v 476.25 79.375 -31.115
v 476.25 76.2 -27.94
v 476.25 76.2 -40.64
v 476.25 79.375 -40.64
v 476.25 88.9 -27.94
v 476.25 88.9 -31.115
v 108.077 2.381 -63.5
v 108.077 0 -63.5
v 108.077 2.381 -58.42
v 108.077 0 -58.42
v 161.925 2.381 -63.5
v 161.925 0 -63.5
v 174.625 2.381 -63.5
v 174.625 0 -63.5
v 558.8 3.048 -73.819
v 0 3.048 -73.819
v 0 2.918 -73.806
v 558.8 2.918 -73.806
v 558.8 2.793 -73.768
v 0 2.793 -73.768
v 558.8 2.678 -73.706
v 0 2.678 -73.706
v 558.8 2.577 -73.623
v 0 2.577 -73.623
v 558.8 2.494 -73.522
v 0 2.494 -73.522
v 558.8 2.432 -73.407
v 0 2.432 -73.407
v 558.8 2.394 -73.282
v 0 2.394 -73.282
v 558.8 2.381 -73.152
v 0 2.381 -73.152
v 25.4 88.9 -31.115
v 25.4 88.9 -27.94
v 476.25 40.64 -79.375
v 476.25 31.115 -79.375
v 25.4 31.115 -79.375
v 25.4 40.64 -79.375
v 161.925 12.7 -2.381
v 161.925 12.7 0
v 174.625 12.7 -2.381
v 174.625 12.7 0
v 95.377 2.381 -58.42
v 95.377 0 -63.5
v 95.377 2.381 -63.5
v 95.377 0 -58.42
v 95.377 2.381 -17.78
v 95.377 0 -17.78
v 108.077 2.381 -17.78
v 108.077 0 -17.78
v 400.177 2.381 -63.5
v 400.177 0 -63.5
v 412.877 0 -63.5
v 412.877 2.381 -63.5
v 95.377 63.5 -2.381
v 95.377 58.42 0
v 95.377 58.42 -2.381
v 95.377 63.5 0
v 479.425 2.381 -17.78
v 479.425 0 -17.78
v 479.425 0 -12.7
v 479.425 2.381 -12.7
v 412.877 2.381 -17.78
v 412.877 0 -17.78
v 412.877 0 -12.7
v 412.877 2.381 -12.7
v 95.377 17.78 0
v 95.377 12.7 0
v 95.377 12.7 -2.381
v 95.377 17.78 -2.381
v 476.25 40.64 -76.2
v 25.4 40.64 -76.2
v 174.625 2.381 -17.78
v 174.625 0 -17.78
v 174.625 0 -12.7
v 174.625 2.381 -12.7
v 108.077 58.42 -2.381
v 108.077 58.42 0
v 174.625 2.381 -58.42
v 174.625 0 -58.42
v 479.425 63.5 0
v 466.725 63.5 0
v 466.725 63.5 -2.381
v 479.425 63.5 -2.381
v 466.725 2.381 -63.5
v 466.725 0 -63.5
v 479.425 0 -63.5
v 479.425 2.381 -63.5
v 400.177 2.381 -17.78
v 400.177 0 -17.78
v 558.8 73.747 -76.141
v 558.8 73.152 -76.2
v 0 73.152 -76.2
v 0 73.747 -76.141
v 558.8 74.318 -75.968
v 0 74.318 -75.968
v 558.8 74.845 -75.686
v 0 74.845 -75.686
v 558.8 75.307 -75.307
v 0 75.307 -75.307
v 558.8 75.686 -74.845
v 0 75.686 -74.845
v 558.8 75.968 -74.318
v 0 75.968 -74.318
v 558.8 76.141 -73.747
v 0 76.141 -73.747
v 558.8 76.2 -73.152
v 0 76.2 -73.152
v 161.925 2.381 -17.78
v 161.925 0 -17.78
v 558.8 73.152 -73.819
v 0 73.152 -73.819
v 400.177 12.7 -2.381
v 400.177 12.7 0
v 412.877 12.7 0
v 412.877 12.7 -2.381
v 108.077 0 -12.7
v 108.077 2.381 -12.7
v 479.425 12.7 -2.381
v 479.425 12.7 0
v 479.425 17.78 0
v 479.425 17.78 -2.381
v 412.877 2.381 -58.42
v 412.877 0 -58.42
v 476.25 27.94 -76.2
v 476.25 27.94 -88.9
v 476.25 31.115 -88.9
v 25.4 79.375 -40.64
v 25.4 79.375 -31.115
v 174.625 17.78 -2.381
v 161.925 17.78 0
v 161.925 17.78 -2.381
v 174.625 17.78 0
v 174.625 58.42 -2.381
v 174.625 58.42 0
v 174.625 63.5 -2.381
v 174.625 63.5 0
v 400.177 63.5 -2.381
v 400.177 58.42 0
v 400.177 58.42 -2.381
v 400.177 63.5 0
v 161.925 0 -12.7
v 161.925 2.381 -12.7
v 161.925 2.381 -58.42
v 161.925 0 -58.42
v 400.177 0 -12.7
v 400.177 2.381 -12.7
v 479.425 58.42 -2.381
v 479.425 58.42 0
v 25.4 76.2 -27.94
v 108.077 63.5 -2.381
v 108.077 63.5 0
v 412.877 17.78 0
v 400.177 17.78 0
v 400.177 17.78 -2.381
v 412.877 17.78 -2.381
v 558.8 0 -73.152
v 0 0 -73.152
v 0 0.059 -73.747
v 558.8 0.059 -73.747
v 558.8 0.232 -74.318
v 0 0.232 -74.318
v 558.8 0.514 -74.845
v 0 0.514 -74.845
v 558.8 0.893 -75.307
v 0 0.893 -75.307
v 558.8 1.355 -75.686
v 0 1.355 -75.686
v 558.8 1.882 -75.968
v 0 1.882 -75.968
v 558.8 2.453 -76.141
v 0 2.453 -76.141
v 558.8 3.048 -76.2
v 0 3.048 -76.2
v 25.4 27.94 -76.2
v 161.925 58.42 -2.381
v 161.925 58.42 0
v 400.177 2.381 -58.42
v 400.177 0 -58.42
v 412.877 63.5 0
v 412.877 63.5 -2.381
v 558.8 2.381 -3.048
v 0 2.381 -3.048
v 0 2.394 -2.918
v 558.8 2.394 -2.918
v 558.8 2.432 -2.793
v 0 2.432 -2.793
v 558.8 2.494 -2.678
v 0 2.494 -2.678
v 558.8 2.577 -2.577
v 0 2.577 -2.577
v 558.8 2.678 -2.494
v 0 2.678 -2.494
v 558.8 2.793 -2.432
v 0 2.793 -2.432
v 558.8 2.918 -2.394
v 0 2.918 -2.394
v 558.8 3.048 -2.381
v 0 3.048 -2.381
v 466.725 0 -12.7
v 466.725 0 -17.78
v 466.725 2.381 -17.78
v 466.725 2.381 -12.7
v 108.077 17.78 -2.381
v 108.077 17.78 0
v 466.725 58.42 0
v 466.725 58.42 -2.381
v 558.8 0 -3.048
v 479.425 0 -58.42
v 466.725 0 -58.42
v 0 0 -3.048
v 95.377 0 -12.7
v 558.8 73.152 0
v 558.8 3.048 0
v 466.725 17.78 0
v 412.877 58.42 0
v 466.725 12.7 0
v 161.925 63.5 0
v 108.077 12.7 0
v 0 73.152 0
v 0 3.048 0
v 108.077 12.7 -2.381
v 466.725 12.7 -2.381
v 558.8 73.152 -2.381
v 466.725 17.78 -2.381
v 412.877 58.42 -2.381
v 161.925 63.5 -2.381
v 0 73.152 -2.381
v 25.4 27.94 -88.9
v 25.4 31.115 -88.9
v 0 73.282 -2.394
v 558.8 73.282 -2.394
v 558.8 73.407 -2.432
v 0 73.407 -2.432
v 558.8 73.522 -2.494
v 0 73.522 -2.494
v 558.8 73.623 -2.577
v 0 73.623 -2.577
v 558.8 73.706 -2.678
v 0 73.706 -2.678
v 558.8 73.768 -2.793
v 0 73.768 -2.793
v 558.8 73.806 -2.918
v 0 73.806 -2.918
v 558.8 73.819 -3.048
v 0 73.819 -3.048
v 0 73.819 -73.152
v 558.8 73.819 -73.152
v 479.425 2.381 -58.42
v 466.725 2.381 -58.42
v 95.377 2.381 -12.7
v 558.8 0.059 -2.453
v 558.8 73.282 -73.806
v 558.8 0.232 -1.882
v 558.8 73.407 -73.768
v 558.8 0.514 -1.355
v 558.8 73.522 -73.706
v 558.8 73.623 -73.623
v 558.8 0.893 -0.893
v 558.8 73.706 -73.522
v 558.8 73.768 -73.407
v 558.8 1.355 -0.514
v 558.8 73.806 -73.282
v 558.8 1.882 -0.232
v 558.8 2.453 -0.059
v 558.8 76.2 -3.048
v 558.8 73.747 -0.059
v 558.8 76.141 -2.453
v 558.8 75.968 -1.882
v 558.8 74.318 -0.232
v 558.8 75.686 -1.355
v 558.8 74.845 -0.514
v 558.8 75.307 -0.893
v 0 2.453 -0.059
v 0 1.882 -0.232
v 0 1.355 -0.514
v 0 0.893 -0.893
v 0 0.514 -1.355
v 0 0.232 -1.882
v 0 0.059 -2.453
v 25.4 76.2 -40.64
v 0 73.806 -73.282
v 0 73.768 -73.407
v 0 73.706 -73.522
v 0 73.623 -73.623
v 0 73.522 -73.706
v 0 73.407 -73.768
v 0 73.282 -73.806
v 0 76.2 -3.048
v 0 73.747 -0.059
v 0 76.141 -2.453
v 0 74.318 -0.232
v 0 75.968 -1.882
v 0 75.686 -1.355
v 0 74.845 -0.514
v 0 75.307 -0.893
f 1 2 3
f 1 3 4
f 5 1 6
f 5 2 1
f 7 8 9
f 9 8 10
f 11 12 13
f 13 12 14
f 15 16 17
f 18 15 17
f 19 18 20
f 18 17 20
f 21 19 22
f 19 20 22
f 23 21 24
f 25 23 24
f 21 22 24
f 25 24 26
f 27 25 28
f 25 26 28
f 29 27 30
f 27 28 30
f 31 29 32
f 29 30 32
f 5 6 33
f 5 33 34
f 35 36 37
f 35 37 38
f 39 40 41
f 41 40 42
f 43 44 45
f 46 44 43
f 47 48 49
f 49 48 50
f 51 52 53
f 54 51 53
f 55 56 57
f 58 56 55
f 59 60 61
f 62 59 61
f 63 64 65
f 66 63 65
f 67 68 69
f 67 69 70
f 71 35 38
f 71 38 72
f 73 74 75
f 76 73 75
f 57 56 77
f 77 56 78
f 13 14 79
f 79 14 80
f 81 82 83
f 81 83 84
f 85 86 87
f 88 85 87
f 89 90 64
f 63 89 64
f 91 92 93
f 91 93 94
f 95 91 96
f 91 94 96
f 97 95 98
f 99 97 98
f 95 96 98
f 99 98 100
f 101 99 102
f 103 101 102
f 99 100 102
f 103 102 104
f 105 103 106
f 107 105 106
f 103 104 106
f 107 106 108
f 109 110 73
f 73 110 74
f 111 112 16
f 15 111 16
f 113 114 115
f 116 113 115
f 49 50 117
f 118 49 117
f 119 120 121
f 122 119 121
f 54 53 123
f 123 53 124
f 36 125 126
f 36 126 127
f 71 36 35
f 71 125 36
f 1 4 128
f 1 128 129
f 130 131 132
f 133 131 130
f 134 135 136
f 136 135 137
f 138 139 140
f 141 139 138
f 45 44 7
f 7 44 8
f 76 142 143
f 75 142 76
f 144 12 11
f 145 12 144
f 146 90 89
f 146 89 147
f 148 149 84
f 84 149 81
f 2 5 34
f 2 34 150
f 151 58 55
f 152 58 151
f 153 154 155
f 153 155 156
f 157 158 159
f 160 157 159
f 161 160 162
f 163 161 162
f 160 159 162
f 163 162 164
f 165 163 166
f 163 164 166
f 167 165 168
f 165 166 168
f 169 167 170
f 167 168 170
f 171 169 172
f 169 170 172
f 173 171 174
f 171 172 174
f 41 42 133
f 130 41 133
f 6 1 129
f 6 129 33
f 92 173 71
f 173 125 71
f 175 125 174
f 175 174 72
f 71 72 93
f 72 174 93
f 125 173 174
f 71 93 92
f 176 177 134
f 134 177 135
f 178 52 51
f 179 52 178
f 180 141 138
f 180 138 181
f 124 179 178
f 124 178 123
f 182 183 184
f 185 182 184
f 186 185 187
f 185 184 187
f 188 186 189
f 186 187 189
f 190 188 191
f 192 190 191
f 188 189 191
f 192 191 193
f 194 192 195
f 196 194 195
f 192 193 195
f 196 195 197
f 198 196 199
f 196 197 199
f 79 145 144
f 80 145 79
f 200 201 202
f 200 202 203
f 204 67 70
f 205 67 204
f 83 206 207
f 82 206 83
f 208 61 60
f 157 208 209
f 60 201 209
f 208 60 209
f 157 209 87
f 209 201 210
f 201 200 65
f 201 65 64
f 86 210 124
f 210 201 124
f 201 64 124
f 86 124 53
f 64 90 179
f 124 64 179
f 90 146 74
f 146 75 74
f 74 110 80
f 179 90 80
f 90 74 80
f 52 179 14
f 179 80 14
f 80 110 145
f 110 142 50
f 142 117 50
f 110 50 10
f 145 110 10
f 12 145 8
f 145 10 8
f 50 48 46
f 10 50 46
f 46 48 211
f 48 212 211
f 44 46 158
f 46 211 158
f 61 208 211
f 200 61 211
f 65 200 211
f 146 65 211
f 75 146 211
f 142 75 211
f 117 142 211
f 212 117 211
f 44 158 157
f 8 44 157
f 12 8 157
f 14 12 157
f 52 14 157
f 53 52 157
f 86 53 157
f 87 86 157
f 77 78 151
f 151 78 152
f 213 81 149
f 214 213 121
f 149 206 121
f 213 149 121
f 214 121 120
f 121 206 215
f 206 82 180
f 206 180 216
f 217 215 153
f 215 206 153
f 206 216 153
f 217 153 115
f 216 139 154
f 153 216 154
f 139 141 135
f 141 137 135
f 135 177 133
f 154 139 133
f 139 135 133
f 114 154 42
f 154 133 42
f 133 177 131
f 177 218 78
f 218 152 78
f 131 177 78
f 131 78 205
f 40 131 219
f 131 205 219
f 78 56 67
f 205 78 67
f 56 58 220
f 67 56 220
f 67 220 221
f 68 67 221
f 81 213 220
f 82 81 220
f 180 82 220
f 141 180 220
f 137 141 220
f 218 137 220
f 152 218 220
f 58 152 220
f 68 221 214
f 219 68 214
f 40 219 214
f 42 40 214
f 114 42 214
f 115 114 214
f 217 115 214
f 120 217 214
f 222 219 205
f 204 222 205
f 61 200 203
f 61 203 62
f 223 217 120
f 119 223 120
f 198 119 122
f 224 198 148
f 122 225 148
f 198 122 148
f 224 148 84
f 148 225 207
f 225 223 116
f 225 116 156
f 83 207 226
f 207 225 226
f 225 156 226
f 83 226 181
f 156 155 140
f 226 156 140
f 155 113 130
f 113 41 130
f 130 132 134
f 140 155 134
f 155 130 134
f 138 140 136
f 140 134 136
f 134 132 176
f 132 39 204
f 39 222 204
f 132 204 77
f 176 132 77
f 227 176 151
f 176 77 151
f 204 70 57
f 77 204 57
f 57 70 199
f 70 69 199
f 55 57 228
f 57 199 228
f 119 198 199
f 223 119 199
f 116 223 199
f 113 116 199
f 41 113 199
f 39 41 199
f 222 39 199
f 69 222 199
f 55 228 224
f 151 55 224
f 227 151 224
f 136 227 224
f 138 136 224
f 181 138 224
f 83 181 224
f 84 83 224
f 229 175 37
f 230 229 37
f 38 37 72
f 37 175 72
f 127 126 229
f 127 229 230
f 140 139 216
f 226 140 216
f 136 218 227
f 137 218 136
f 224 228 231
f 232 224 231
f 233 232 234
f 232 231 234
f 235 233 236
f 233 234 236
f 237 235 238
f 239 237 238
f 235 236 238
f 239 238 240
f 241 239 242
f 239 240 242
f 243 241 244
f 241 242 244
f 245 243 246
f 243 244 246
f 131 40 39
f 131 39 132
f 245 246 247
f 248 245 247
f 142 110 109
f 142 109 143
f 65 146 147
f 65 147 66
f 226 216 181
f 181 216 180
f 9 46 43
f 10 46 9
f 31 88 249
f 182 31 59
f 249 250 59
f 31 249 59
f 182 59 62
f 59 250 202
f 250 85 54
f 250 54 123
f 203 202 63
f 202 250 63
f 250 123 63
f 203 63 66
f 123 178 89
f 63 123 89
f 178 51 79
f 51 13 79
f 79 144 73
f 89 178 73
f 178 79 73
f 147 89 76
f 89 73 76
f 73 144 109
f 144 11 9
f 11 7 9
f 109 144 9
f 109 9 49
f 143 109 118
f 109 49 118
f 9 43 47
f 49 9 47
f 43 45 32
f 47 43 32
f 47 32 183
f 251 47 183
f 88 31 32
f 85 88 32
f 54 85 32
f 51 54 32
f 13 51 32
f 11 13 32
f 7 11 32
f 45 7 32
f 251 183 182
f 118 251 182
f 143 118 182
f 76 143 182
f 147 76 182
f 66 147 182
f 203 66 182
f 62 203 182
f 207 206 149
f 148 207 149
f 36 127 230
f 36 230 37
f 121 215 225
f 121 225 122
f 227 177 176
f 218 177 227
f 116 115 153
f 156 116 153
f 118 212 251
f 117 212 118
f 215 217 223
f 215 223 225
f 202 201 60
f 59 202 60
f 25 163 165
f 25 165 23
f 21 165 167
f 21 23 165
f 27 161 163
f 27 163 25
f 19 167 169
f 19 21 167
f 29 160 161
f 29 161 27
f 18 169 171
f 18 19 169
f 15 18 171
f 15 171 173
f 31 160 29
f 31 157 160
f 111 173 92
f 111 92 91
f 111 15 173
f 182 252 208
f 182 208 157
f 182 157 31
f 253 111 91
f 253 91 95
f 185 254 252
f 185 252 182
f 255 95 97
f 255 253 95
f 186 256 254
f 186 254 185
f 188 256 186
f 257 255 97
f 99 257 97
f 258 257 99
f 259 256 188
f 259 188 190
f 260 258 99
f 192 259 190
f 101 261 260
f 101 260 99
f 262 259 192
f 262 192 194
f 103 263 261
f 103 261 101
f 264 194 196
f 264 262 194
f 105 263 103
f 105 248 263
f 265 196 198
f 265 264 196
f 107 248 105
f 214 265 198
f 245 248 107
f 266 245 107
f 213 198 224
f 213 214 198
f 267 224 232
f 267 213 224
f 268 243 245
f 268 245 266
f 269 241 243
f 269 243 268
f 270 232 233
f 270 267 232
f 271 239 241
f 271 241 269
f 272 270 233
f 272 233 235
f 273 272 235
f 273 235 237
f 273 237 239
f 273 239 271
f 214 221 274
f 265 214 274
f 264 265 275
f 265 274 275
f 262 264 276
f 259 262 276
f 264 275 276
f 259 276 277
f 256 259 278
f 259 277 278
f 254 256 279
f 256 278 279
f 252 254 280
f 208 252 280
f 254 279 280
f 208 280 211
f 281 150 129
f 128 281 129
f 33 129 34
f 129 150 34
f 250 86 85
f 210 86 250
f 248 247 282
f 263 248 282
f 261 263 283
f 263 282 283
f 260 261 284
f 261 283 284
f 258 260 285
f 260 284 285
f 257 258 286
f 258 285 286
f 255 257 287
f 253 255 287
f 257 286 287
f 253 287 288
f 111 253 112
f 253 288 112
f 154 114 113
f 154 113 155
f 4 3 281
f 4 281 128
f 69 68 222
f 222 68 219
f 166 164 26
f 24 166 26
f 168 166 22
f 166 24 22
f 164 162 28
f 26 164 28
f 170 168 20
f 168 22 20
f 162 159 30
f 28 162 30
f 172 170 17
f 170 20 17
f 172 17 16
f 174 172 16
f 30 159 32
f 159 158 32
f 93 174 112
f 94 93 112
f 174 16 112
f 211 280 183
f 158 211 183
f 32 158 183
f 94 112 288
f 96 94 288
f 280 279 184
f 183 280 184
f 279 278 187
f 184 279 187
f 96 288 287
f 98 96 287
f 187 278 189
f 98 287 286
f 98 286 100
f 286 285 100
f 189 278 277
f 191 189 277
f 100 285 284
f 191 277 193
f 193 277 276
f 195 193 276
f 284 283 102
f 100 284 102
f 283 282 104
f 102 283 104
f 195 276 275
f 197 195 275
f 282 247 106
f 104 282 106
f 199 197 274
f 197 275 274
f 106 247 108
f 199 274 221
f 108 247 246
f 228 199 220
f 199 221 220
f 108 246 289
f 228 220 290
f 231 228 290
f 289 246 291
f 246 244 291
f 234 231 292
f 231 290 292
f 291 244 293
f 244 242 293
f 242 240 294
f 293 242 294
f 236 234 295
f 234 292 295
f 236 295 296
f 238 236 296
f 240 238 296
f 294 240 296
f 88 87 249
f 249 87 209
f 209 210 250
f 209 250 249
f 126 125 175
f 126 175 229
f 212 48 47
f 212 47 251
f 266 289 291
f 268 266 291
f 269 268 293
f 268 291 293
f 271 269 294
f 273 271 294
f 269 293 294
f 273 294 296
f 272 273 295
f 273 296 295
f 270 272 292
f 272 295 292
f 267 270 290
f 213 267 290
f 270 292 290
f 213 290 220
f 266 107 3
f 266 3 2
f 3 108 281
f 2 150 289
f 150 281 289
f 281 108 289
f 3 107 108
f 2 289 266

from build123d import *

# Parameters (mm, degrees)
F1_DEPTH = 558.8
F2_W     = 12.7
F2_H     = 5.08
F3_DEPTH = 2.38125
F4_DEPTH = 2.38125
F5_W     = 12.7
F5_H     = 5.08
F6_DEPTH = 2.38125
F8_DEPTH = 533.4
F9_DEPTH = 82.55


with BuildPart() as f1:
    # F0 (on Right) → F1 (new body)
    with BuildSketch(Plane.YZ):
        with BuildLine():
            Line((73.152, 0), (3.048, 0))
            ThreePointArc((3.048, 0), (0.892739, -0.892739), (0, -3.048))
            Line((0, -3.048), (0, -73.152))
            ThreePointArc((0, -73.152), (0.892739, -75.307261), (3.048, -76.2))
            Line((3.048, -76.2), (73.152, -76.2))
            ThreePointArc((73.152, -76.2), (75.307261, -75.307261), (76.2, -73.152))
            Line((76.2, -73.152), (76.2, -3.048))
            ThreePointArc((76.2, -3.048), (75.307261, -0.892739), (73.152, 0))
        make_face()
        with BuildLine():
            ThreePointArc((73.152, -2.38125), (73.623463, -2.576537), (73.81875, -3.048))
            Line((73.81875, -3.048), (73.81875, -73.152))
            ThreePointArc((73.81875, -73.152), (73.623463, -73.623463), (73.152, -73.81875))
            Line((73.152, -73.81875), (3.048, -73.81875))
            ThreePointArc((3.048, -73.81875), (2.576537, -73.623463), (2.38125, -73.152))
            Line((2.38125, -73.152), (2.38125, -3.048))
            ThreePointArc((2.38125, -3.048), (2.576537, -2.576537), (3.048, -2.38125))
            Line((3.048, -2.38125), (73.152, -2.38125))
        make_face(mode=Mode.SUBTRACT)
    extrude(amount=F1_DEPTH)

    # F2 (on face) → F3 (cut)
    with BuildSketch(Plane.XY):
        with Locations((473.075, 60.96)):
            Rectangle(F2_W, F2_H)
        with Locations((473.075, 15.24)):
            Rectangle(F2_W, F2_H)
        with Locations((406.527, 15.24)):
            Rectangle(F2_W, F2_H)
        with Locations((406.527, 60.96)):
            Rectangle(F2_W, F2_H)
    extrude(amount=-F3_DEPTH, mode=Mode.SUBTRACT)

    # F2 (on face) → F4 (cut)
    with BuildSketch(Plane.XY):
        with Locations((168.275, 60.96)):
            Rectangle(F2_W, F2_H)
        with Locations((168.275, 15.24)):
            Rectangle(F2_W, F2_H)
        with Locations((101.727, 15.24)):
            Rectangle(F2_W, F2_H)
        with Locations((101.727, 60.96)):
            Rectangle(F2_W, F2_H)
    extrude(amount=-F4_DEPTH, mode=Mode.SUBTRACT)

    # F5 (on face) → F6 (cut)
    with BuildSketch(Plane.XZ):
        with Locations((473.075, -15.24)):
            Rectangle(F5_W, F5_H)
        with Locations((473.075, -60.96)):
            Rectangle(F5_W, F5_H)
        with Locations((406.527, -60.96)):
            Rectangle(F5_W, F5_H)
        with Locations((406.527, -15.24)):
            Rectangle(F5_W, F5_H)
        with Locations((168.275, -60.96)):
            Rectangle(F5_W, F5_H)
        with Locations((168.275, -15.24)):
            Rectangle(F5_W, F5_H)
        with Locations((101.727, -60.96)):
            Rectangle(F5_W, F5_H)
        with Locations((101.727, -15.24)):
            Rectangle(F5_W, F5_H)
    extrude(amount=-F6_DEPTH, mode=Mode.SUBTRACT)

    # F7 (on face) → F8 (join)
    with BuildSketch(Plane.YZ.offset(558.8)):
        Polygon((88.9, -27.94), (76.2, -27.94), (76.2, -40.64), (79.375, -40.64), (79.375, -31.115), (88.9, -31.115), align=None)
        Polygon((40.64, -79.375), (40.64, -76.2), (27.94, -76.2), (27.94, -88.9), (31.115, -88.9), (31.115, -79.375), align=None)
    extrude(amount=-F8_DEPTH)

    # F7 (on face) → F9 (cut)
    with BuildSketch(Plane.YZ.offset(558.8)):
        Polygon((88.9, -27.94), (76.2, -27.94), (76.2, -40.64), (79.375, -40.64), (79.375, -31.115), (88.9, -31.115), align=None)
        Polygon((40.64, -79.375), (40.64, -76.2), (27.94, -76.2), (27.94, -88.9), (31.115, -88.9), (31.115, -79.375), align=None)
    extrude(amount=-F9_DEPTH, mode=Mode.SUBTRACT)


solid = f1.part
